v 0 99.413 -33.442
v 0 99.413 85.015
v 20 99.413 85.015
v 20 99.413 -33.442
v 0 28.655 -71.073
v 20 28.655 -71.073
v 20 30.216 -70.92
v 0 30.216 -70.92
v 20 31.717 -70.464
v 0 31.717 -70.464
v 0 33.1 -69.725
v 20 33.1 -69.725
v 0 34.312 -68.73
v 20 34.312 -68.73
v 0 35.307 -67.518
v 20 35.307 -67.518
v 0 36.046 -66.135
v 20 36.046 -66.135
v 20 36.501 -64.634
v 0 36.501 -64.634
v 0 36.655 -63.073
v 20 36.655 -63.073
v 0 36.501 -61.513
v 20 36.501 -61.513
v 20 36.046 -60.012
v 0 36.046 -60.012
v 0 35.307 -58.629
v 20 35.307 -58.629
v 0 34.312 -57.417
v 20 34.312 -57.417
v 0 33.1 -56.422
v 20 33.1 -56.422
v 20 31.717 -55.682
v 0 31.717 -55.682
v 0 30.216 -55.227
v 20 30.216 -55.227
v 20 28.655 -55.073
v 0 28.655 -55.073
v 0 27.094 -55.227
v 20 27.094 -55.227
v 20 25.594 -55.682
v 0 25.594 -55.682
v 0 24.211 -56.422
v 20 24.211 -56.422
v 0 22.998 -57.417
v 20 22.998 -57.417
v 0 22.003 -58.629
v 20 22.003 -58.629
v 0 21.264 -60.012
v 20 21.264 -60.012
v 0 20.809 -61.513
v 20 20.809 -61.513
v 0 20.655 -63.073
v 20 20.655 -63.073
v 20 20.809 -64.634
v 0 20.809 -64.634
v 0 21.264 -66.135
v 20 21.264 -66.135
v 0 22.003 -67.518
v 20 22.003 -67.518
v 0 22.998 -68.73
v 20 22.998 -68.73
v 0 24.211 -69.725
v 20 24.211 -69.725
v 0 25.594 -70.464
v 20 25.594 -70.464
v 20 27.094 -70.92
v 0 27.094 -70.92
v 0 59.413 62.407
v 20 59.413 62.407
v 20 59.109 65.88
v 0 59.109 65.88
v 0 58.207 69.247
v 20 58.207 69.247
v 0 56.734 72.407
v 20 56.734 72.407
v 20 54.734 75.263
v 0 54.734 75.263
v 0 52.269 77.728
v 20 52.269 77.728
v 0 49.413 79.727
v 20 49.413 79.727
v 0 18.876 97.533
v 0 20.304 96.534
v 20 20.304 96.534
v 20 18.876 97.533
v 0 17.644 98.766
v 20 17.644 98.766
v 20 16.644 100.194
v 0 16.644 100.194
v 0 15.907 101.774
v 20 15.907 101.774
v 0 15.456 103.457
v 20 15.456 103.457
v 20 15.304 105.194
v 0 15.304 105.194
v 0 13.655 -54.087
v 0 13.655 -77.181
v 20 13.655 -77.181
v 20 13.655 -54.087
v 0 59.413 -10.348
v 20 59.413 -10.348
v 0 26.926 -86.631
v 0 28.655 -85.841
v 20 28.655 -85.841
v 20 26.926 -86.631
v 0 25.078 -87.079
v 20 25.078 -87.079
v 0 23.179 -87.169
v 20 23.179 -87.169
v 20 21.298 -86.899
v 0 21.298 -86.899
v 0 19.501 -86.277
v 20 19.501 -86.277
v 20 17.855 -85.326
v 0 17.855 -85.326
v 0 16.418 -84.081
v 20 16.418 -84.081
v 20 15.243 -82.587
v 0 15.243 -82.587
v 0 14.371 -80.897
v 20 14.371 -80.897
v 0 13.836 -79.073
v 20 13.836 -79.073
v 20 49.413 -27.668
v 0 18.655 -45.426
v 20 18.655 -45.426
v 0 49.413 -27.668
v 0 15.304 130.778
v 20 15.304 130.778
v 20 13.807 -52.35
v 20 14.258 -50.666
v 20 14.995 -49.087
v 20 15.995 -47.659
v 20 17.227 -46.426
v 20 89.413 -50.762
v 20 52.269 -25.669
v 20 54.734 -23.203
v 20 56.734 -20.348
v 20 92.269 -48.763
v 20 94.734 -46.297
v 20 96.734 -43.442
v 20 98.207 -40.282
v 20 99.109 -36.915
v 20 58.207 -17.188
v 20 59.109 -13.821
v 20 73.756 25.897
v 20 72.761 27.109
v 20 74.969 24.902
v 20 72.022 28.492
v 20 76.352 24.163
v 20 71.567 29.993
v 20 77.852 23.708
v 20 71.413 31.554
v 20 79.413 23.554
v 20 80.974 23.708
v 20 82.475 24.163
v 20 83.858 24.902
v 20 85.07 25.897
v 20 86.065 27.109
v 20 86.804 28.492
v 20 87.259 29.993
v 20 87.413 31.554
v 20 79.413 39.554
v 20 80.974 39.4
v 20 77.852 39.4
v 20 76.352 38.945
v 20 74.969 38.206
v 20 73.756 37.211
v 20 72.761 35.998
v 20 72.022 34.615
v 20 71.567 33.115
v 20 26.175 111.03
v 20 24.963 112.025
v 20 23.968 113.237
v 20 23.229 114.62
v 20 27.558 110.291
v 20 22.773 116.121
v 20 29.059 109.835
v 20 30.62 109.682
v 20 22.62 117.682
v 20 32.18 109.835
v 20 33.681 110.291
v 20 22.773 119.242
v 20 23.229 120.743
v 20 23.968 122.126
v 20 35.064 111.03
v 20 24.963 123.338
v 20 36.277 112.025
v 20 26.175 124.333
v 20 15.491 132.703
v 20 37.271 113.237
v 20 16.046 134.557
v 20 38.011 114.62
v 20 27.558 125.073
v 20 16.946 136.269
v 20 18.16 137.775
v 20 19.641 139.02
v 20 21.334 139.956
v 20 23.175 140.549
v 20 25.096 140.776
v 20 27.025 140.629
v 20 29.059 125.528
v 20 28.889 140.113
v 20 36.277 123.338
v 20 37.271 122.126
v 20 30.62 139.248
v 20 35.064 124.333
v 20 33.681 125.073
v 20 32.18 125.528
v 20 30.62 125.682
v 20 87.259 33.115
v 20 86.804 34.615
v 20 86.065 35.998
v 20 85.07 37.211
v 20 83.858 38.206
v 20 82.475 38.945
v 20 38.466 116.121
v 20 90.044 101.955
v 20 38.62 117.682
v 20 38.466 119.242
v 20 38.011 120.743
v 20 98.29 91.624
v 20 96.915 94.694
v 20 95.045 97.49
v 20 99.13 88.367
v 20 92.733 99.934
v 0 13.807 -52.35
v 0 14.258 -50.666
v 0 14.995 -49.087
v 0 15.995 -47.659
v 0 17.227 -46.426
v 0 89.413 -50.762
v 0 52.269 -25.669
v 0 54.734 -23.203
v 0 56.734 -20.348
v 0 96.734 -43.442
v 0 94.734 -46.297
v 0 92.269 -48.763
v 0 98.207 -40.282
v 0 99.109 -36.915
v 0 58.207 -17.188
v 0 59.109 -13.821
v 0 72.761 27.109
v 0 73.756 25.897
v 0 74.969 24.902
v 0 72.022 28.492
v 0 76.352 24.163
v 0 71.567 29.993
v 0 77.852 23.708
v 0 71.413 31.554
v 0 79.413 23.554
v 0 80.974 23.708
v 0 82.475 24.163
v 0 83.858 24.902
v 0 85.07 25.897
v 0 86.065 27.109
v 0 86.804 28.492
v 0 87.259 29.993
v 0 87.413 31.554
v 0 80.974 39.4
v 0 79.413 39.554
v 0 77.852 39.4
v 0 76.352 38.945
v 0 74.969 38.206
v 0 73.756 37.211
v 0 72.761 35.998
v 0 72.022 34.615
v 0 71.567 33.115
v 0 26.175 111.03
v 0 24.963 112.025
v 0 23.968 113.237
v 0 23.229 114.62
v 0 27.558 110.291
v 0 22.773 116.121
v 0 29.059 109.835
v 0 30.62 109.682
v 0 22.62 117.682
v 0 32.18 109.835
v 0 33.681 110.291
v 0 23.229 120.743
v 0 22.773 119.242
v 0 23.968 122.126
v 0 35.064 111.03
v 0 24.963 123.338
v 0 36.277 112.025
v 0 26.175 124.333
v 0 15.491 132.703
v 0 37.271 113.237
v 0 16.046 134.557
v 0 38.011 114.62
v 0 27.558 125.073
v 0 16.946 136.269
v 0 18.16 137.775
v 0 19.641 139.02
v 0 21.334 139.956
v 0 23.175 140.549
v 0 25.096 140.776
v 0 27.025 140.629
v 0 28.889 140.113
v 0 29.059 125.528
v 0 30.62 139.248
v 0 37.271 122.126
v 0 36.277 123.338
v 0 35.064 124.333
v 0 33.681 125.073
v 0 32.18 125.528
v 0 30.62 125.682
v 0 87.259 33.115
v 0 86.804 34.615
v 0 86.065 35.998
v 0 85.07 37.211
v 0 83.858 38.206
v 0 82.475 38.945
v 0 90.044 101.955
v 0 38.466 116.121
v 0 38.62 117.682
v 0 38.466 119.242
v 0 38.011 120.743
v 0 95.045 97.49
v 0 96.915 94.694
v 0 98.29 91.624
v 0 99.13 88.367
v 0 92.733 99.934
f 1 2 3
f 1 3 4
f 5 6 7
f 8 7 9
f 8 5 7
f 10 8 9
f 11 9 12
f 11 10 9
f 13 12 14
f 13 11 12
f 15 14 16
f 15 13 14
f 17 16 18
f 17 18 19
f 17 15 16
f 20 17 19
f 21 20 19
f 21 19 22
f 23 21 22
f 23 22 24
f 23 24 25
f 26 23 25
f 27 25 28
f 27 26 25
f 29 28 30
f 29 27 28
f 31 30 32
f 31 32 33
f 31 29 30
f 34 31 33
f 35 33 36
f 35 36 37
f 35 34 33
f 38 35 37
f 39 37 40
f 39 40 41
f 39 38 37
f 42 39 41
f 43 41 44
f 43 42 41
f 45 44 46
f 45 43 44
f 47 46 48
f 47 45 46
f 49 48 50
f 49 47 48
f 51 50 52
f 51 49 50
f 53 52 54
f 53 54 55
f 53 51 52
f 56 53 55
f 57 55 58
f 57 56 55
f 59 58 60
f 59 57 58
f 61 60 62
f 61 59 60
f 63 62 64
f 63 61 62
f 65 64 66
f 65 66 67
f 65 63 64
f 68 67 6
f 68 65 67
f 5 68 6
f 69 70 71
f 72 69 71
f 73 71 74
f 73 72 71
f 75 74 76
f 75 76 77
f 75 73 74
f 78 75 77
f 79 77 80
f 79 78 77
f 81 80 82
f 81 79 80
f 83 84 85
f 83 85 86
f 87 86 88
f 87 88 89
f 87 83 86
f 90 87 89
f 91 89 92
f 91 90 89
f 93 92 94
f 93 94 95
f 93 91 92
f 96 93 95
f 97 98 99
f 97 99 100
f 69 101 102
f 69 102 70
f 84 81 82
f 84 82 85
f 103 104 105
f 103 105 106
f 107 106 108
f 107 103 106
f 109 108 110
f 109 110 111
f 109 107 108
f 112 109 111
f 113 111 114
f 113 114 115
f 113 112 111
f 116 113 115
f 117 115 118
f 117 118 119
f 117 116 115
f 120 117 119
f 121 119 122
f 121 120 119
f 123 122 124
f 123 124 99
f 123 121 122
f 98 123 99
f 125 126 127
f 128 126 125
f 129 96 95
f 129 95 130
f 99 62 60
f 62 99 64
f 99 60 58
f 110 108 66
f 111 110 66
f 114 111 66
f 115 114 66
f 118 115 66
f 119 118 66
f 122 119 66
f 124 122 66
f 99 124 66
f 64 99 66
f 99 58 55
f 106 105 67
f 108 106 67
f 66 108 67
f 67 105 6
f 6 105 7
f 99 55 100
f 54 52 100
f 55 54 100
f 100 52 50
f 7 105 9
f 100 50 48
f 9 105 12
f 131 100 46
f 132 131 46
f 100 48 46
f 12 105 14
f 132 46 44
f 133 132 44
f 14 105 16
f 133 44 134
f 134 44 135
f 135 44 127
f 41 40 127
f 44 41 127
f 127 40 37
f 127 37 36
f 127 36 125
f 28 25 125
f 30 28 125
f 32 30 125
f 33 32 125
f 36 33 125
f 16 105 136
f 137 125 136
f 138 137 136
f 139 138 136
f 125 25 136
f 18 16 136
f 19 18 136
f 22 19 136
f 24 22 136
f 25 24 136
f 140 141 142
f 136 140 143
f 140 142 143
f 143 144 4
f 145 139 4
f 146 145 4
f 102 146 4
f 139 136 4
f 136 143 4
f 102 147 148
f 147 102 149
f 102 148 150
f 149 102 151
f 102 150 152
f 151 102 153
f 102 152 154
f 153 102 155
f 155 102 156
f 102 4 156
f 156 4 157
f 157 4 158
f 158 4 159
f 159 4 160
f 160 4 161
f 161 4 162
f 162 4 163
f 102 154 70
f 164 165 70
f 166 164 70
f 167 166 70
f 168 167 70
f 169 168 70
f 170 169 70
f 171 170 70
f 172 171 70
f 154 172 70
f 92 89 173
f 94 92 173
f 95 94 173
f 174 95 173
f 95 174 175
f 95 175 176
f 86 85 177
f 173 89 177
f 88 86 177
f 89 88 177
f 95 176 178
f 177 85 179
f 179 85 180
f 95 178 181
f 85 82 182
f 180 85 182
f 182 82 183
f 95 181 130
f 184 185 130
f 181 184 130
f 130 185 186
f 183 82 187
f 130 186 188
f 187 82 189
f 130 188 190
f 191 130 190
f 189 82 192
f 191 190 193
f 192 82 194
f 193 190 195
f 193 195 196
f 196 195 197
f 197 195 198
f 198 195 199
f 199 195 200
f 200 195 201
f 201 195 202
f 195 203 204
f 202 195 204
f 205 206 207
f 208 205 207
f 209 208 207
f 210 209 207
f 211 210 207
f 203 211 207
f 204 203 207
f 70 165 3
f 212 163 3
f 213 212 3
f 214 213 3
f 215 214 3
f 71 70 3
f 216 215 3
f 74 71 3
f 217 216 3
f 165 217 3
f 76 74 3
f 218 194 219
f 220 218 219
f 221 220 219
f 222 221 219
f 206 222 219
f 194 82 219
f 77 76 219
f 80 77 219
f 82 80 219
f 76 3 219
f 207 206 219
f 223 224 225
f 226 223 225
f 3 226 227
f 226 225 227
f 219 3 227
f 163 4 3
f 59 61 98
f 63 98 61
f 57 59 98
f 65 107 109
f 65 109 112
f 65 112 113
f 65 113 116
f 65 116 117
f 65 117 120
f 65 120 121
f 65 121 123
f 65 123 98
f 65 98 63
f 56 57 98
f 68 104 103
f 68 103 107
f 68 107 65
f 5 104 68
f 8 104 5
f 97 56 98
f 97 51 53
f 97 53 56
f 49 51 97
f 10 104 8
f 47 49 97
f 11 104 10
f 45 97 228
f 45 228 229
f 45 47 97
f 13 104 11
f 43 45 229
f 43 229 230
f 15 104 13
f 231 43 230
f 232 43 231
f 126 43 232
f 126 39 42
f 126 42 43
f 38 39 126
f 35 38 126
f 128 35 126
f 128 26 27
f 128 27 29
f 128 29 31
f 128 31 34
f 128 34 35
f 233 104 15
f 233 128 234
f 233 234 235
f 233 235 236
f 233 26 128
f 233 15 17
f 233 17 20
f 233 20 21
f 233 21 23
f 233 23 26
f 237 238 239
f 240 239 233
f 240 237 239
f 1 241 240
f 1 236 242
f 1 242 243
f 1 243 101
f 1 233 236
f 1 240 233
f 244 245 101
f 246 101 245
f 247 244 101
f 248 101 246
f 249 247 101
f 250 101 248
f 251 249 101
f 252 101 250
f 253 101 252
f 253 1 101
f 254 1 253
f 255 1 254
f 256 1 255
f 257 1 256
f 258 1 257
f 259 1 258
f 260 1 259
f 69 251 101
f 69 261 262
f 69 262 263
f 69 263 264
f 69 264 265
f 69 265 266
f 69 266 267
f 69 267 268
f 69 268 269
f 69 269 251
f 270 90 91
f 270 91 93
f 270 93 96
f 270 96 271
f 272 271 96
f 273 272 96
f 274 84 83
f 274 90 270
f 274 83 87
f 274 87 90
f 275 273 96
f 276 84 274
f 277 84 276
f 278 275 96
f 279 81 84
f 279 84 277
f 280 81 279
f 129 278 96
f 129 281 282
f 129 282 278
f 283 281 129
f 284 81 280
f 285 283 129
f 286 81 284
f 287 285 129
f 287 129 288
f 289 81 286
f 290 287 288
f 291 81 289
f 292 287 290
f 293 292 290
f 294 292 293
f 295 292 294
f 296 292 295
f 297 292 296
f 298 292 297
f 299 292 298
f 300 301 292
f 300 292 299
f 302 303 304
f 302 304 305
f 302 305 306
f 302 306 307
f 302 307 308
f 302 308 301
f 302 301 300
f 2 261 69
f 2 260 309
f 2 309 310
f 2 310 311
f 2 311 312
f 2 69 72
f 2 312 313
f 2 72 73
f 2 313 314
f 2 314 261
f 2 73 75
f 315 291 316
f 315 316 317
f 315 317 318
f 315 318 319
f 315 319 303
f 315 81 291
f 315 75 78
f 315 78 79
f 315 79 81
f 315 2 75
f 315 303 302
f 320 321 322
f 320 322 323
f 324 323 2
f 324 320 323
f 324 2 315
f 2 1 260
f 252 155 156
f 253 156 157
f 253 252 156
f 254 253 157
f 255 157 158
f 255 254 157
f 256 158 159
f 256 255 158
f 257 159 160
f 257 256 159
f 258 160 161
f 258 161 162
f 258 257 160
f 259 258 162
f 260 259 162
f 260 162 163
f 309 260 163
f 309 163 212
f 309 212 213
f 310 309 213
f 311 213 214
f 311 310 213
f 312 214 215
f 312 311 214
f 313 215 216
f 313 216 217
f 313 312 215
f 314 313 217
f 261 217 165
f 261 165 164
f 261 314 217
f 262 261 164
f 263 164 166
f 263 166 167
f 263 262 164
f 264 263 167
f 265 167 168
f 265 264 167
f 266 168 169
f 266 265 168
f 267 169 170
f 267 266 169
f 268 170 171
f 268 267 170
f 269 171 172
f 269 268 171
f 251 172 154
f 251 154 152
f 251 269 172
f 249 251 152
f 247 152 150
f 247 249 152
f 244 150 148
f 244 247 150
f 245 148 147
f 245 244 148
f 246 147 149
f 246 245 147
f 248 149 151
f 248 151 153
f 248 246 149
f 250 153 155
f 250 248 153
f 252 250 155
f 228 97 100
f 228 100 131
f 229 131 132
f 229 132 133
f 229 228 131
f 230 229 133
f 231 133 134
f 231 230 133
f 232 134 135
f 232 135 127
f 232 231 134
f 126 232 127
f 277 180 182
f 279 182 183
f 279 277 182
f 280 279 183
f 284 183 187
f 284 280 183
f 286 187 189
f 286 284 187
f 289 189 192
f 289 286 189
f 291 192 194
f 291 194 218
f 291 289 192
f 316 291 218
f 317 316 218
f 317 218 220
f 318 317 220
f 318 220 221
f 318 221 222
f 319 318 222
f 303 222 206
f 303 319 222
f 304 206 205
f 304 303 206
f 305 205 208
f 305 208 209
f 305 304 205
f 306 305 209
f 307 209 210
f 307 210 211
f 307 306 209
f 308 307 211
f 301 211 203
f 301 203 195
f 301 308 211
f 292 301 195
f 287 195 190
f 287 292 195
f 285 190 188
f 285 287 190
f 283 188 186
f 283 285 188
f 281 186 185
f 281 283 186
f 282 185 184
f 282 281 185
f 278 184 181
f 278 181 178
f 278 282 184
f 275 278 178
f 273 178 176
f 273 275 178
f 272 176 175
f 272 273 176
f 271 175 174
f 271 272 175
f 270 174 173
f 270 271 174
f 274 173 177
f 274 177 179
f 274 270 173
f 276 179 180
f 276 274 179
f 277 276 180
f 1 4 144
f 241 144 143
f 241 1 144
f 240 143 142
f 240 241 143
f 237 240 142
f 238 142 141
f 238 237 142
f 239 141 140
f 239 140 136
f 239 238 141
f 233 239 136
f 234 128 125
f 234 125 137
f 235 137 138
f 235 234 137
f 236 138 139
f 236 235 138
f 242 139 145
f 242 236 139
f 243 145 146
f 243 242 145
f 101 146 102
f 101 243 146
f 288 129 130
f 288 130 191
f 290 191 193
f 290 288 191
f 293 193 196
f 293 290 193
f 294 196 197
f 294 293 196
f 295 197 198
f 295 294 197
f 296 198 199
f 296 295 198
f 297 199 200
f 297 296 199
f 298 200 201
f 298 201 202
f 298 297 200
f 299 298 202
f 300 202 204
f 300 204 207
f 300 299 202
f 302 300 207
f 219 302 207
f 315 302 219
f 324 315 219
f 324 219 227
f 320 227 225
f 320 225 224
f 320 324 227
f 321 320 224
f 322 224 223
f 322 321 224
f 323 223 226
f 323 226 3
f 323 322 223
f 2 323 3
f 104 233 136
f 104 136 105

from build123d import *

# Parameters (mm, degrees)
SKETCH1_R           = 8
BOSS_EXTRUDE1_DEPTH = 20


with BuildPart() as part:
    # Sketch1 → Boss-Extrude1 (new body)
    with BuildSketch(Plane(origin=(0, 0, 0), x_dir=(0, 0, -1), z_dir=(1, 0, 0))):
        with BuildLine():
            Line((-139.248116041, 30.619697735), (-101.955216425, 90.044413341))
            ThreePointArc((-101.955216425, 90.044413341), (-94.694061218, 96.914975381), (-85.014811773, 99.413200323))
            Line((-85.014811773, 99.413200323), (33.441717862, 99.413200323))
            ThreePointArc((33.441717862, 99.413200323), (43.441717862, 96.733708398), (50.762225937, 89.413200323))
            Line((50.762225937, 89.413200323), (85.840913151, 28.655131806))
            ThreePointArc((85.840913151, 28.655131806), (85.840913151, 18.655131806), (77.180659113, 13.655131806))
            Line((77.180659113, 13.655131806), (54.086648345, 13.655131806))
            ThreePointArc((54.086648345, 13.655131806), (49.086648345, 14.994877768), (45.426394308, 18.655131806))
            Line((45.426394308, 18.655131806), (27.66821517, 49.413200323))
            ThreePointArc((27.66821517, 49.413200323), (20.347707094, 56.733708398), (10.347707094, 59.413200323))
            Line((10.347707094, 59.413200323), (-62.406928949, 59.413200323))
            ThreePointArc((-62.406928949, 59.413200323), (-72.406928949, 56.733708398), (-79.727437025, 49.413200323))
            Line((-79.727437025, 49.413200323), (-96.533588998, 20.304091226))
            ThreePointArc((-96.533588998, 20.304091226), (-100.193843035, 16.643837188), (-105.193843035, 15.304091226))
            Line((-105.193843035, 15.304091226), (-130.777913715, 15.304091226))
            ThreePointArc((-130.777913715, 15.304091226), (-139.528801244, 20.464466504), (-139.248116041, 30.619697735))
        make_face()
        with Locations((-31.553843665, 79.413200323)):
            Circle(SKETCH1_R, mode=Mode.SUBTRACT)
        with Locations((-117.681607113, 30.619697735)):
            Circle(SKETCH1_R, mode=Mode.SUBTRACT)
        with Locations((63.073370123, 28.655131806)):
            Circle(SKETCH1_R, mode=Mode.SUBTRACT)
    extrude(amount=BOSS_EXTRUDE1_DEPTH)


solid = part.part
